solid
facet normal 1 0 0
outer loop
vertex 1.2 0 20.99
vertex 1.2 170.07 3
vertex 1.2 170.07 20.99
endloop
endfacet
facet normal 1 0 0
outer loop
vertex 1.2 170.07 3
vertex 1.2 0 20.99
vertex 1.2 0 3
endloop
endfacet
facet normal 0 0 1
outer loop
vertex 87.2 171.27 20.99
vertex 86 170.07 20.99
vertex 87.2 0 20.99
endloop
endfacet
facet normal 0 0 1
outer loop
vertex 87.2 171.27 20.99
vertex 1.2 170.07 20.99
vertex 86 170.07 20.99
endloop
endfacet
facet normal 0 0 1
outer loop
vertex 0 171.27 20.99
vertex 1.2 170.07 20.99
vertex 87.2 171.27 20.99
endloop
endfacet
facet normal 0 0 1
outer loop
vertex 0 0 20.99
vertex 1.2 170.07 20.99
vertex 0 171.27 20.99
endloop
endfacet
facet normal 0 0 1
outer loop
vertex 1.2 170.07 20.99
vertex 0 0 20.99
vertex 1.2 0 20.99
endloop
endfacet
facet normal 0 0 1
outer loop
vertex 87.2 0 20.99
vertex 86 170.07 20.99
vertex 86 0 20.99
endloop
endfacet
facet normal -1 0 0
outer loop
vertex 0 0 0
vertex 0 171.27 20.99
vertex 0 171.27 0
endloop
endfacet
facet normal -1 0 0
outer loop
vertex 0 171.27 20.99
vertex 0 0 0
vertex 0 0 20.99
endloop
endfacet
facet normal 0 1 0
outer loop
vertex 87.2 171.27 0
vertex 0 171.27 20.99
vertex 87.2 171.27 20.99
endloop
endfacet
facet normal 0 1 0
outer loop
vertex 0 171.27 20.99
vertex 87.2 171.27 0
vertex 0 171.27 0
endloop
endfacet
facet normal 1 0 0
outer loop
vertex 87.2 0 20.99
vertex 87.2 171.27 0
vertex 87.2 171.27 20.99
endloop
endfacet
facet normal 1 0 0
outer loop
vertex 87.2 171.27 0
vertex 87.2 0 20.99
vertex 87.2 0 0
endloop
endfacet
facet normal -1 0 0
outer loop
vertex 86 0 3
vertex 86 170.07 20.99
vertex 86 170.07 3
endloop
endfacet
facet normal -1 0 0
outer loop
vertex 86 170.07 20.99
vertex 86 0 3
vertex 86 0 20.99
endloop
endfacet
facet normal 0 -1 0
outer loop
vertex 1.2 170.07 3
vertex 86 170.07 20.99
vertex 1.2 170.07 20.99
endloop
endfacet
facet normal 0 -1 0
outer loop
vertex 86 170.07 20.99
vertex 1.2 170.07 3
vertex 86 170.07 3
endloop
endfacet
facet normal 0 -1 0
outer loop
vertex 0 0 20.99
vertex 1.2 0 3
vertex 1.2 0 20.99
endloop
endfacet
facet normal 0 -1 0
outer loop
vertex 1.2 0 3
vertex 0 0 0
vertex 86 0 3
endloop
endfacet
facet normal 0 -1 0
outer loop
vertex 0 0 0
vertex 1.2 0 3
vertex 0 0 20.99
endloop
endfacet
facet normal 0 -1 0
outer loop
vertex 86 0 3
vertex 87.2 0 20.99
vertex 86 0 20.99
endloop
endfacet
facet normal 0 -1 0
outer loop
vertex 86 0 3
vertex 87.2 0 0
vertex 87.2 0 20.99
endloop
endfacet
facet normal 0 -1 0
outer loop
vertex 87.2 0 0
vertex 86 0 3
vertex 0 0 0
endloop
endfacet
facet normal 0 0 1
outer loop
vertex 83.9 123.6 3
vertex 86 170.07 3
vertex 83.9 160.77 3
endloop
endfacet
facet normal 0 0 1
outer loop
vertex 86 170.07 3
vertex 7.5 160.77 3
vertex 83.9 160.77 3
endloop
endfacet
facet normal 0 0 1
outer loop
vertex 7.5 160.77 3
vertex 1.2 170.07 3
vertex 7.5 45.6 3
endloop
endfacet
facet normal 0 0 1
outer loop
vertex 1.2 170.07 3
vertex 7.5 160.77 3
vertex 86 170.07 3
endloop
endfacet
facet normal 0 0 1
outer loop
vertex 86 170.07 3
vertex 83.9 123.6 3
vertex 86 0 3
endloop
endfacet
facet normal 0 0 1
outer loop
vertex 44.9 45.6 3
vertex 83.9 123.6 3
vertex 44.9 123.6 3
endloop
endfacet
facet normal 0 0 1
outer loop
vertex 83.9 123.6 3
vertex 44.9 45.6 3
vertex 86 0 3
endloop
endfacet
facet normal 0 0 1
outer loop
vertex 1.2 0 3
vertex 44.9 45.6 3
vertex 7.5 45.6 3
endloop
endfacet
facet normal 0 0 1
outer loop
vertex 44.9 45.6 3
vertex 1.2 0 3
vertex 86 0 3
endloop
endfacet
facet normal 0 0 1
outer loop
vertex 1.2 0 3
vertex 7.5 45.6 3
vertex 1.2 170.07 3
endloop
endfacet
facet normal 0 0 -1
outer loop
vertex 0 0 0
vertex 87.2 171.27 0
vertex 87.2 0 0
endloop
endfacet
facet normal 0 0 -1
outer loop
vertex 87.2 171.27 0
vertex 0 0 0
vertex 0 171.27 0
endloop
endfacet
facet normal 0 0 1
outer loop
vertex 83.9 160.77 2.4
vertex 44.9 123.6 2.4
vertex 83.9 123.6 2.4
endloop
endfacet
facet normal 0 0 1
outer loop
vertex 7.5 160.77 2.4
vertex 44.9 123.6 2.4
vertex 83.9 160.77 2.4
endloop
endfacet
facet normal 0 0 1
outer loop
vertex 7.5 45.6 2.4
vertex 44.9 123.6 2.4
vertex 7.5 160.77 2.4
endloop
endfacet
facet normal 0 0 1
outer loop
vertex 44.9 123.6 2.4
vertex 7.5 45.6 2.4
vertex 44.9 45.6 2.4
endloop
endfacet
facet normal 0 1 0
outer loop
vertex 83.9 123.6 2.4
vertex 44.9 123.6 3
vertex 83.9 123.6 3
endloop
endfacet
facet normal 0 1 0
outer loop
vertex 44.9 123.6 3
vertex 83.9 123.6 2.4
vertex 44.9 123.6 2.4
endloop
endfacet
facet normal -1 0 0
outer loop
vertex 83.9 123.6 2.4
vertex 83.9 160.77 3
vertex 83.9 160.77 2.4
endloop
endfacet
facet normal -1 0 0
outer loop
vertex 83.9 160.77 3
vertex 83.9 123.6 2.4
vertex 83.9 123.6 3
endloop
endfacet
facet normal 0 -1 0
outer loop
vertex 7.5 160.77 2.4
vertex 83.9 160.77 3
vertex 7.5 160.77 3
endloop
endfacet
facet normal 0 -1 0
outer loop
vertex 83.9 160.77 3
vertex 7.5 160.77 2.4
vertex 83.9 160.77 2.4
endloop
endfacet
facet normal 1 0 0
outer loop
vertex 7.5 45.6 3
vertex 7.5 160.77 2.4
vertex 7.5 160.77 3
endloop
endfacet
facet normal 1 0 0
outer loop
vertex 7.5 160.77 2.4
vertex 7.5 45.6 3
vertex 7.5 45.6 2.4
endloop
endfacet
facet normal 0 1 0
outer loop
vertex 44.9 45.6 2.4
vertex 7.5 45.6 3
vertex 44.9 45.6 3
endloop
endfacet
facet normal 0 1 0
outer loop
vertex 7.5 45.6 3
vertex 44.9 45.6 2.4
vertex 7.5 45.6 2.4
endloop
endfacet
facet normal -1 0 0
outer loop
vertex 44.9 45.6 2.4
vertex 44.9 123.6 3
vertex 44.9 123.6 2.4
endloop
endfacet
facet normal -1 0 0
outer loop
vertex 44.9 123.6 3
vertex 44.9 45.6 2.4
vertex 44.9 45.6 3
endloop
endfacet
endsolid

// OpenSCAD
// file: _house_dimensions.scad
// house-model house.yaml sha256:b403971d6ccc486d2b9b900240d76d123e38841db81cfec51cfa9b3c422aa123 body sha256:1576417733979c84b3390dbbce24bebfcbb94d447da4fc7ca72391a9507b883a
// Generated by house-model tools/house_model/export.py from house.yaml.
// Copy this file verbatim into its consumer; never edit it (house-model docs/consuming.md).
// Millimetres in the house-model frame.

// Plot
plot_x0 = -1050;
plot_x1 = 7670;
plot_y0 = -6300;
plot_y1 = 32127;
patio_y0 = 12980;
patio_y1 = 14980;
drive_x0 = 5600;
fence_h = 1800;
fence_y0 = 4400;
east_fence_y0 = 12980;

// Main house
main_x0 = 1970;
main_x1 = 7670;
main_y0 = 0;
main_y1 = 5871;
main_eaves_h = 5300;
main_ridge_h = 6700;
front_overhang = 300;
verge_overhang = 150;
bay_x0 = 2820;
bay_x1 = 5370;
bay_proj = 900;
bay_h = 2700;
canopy_y = -1000;
canopy_z0 = 2350;
canopy_z1 = 2800;
canopy_t = 150;

// Rear extension and first-floor rear block
rear_x0 = 0;
rear_x1 = 7670;
rear_y0 = 5871;
rear_y1 = 12980;
ff_x0 = 2150;
ff_x1 = 7670;
rear_eaves_h = 5100;
rear_ridge_h = 6400;
side_x0 = 0;
side_x1 = 1970;
side_y0 = 4370;
side_y1 = 5871;
flat_h = 3100;
chim_x0 = 1870;
chim_x1 = 2370;
chim_y0 = 3250;
chim_y1 = 3750;
chim_h = 7500;
pot_d = 250;
pot_h = 300;
rooflight_d = 50;

// Garden room
gr_x0 = -280;
gr_x1 = 7320;
gr_y1 = 31057;
gr_north_y0 = 27380;
gr_west_x1 = 3420;
gr_west_y0 = 24580;
gr_wall_h = 2530;
gr_roof_t = 250;
cov_x1 = 3420;
cov_y0 = 19580;
post_w = 150;
low_wall_t = 215;
low_wall_h = 750;

// Openings: [plane, a0, a1, z0, z1]; plane is Y on south/north faces, X on west/east
house_cuts_south = [
    [-900, 3020, 5170, 800, 2280],
    [0, 5960, 7310, 0, 2180],
    [0, 2861, 4570, 3261, 4731],
    [0, 5971, 6560, 3331, 4731],
    [4370, 1000, 1900, 0, 2280]
];
house_cuts_north = [
    [12980, 1200, 6470, 180, 2280],
    [12980, 5151, 6871, 3512, 4862],
    [12980, 3202, 3782, 3512, 4862]
];
house_cuts_west = [
    [0, 5900, 6800, 0, 2080],
    [1970, 4800, 5700, 3150, 4810],
    [2150, 6865, 7764, 3932, 4682],
    [2150, 8456, 9055, 3932, 4682]
];
house_cuts_east = [];
garden_cuts_south = [
    [24580, 1020, 2620, 0, 2100],
    [27380, 4600, 6730, 0, 2100]
];
garden_cuts_north = [];
garden_cuts_west = [
    [-280, 29657, 30257, 1500, 2200]
];
garden_cuts_east = [
    [3420, 25012, 26362, 950, 2200]
];

// Rooflights: [x0, x1, y0, y1]
rooflights = [
    [800, 1550, 7900, 8900],
    [800, 1550, 9700, 10700]
];
// file: _home_model.scad
// =====================================
// Home massing model
// 1:100 printable massing model of a two-storey semi with rear and side
// extensions, its plot and the garden room, from the architect's 1:50
// drawings. All figures below are real millimetres.
// =====================================
// Parts:
//   home_house        -> home_house.stl        house, roofs, bay, canopy, chimney
//   home_garden_room  -> home_garden_room.stl  L-shaped shower/office/workshop
//   home_site_front   -> home_site_front.stl   front plot tile (Y up to 15000)
//   home_site_rear    -> home_site_rear.stl    rear plot tile (Y from 15000)
//   home_assembly     -> home_assembly.stl     viewing aid, not a printable part
//
// Site frame: X east (party wall side), Y towards the rear garden, Z up;
// X = 0 at the west face of the rear extension, Y = 0 at the main house
// front face. scale_denominator divides everything at the end.

$fn = 64;

scale_denominator = 100;
s = 1 / scale_denominator;

// Print-size features (printed mm x scale_denominator)
base_t    = 3   * scale_denominator;
recess_d  = 0.6 * scale_denominator;
relief_h  = 0.5 * scale_denominator;
opening_d = 0.5 * scale_denominator;
fence_t   = 1.2 * scale_denominator;
fit_clear = 0.2 * scale_denominator;
eps = 1;

// Dimensions: plot, main house, rear extension, garden room, opening and
// rooflight lists come from _house_dimensions.scad, a verbatim copy of
// house-model's exports/3d-models/_house_dimensions.scad. Never edit it here.
include <_house_dimensions.scad>

tile_split_y = 15000;
main_ridge_y = (main_y0 + main_y1) / 2;
rear_ridge_x = (ff_x0 + ff_x1) / 2;  hip_len = (ff_x1 - ff_x0) / 2;
gr_h = gr_wall_h + gr_roof_t;

module box(x0, x1, y0, y1, z0, z1) { translate([x0, y0, z0]) cube([x1 - x0, y1 - y0, z1 - z0]); }
module cut_south(y, x0, x1, z0, z1) { box(x0, x1, y - eps, y + opening_d, z0 - eps, z1); }
module cut_north(y, x0, x1, z0, z1) { box(x0, x1, y - opening_d, y + eps, z0 - eps, z1); }
module cut_west(x, y0, y1, z0, z1)  { box(x - eps, x + opening_d, y0, y1, z0 - eps, z1); }
module cut_east(x, y0, y1, z0, z1)  { box(x - opening_d, x + eps, y0, y1, z0 - eps, z1); }
module yz_prism(x0, x1, pts) { translate([x0, 0, 0]) rotate([90, 0, 90]) linear_extrude(x1 - x0) polygon(pts); }

module main_roof() {
    k = (main_ridge_h - main_eaves_h) / (main_ridge_y - main_y0);
    yz_prism(main_x0 - verge_overhang, main_x1, [
        [main_y0 - front_overhang, main_eaves_h - front_overhang * k],
        [main_ridge_y, main_ridge_h], [main_y1, main_eaves_h]]);
}
// Hip prism starts under the main ridge so the union forms the valleys.
module rear_roof() {
    hull() {
        box(ff_x0, ff_x1, main_ridge_y, rear_y1, rear_eaves_h - eps, rear_eaves_h);
        box(rear_ridge_x - 1, rear_ridge_x + 1, main_ridge_y, rear_y1 - hip_len, rear_ridge_h - 1, rear_ridge_h);
    }
}
module canopy() {
    yz_prism(bay_x0, main_x1, [[canopy_y, canopy_z0], [eps, canopy_z1],
        [eps, canopy_z1 - canopy_t], [canopy_y, canopy_z0 - canopy_t]]);
}
module chimney() {
    box(chim_x0, chim_x1, chim_y0, chim_y1, 0, chim_h);
    for (x = [chim_x0 + 125, chim_x1 - 125])
        translate([x, (chim_y0 + chim_y1) / 2, chim_h - eps]) cylinder(d = pot_d, h = pot_h + eps);
}
module house_real() {
    difference() {
        union() {
            box(main_x0, main_x1, main_y0, main_y1, 0, main_eaves_h);
            box(rear_x0, rear_x1, rear_y0 - eps, rear_y1, 0, flat_h);
            box(ff_x0, ff_x1, rear_y0 - eps, rear_y1, 0, rear_eaves_h);
            box(side_x0, side_x1 + eps, side_y0, side_y1 + eps, 0, flat_h);
            box(bay_x0, bay_x1, -bay_proj, eps, 0, bay_h);
            main_roof(); rear_roof(); canopy(); chimney();
        }
        for (c = house_cuts_south) cut_south(c[0], c[1], c[2], c[3], c[4]);
        for (c = house_cuts_north) cut_north(c[0], c[1], c[2], c[3], c[4]);
        for (c = house_cuts_west)  cut_west(c[0], c[1], c[2], c[3], c[4]);
        for (c = house_cuts_east)  cut_east(c[0], c[1], c[2], c[3], c[4]);
        for (r = rooflights) box(r[0], r[1], r[2], r[3], flat_h - rooflight_d, flat_h + eps);
    }
}
module garden_room_real() {
    difference() {
        union() {
            box(gr_x0, gr_x1, gr_north_y0, gr_y1, 0, gr_h);
            box(gr_x0, gr_west_x1, gr_west_y0, gr_north_y0 + eps, 0, gr_h);
            box(gr_x0, cov_x1, cov_y0, gr_west_y0 + eps, gr_wall_h, gr_h);
            for (x = [gr_x0, cov_x1 - post_w], y = [cov_y0, (cov_y0 + gr_west_y0) / 2])
                box(x, x + post_w, y, y + post_w, 0, gr_wall_h + eps);
            box(gr_x0, gr_x0 + low_wall_t, cov_y0, gr_west_y0 + eps, 0, low_wall_h);
        }
        for (c = garden_cuts_south) cut_south(c[0], c[1], c[2], c[3], c[4]);
        for (c = garden_cuts_north) cut_north(c[0], c[1], c[2], c[3], c[4]);
        for (c = garden_cuts_west)  cut_west(c[0], c[1], c[2], c[3], c[4]);
        for (c = garden_cuts_east)  cut_east(c[0], c[1], c[2], c[3], c[4]);
    }
}
module house_footprint_2d() {
    translate([main_x0, main_y0]) square([main_x1 - main_x0, main_y1 - main_y0]);
    translate([bay_x0, -bay_proj]) square([bay_x1 - bay_x0, bay_proj + eps]);
    translate([rear_x0, rear_y0 - eps]) square([rear_x1 - rear_x0, rear_y1 - rear_y0 + eps]);
    translate([side_x0, side_y0]) square([side_x1 - side_x0 + eps, side_y1 - side_y0 + eps]);
}
module garden_room_footprint_2d() {
    translate([gr_x0, gr_north_y0]) square([gr_x1 - gr_x0, gr_y1 - gr_north_y0]);
    translate([gr_x0, gr_west_y0]) square([gr_west_x1 - gr_x0, gr_north_y0 - gr_west_y0 + eps]);
    translate([gr_x0, cov_y0]) square([cov_x1 - gr_x0, gr_west_y0 - cov_y0 + eps]);
}
module fences() {
    box(plot_x0, plot_x0 + fence_t, fence_y0, plot_y1, 0, fence_h);
    box(plot_x1 - fence_t, plot_x1, east_fence_y0, plot_y1, 0, fence_h);
    box(plot_x0, plot_x1, plot_y1 - fence_t, plot_y1, 0, fence_h);
    box(plot_x0, 0, fence_y0, fence_y0 + fence_t, 0, fence_h);
}
module relief() {
    box(plot_x0, plot_x1, patio_y0, patio_y1, 0, base_t + relief_h);
    box(plot_x0, 0, plot_y0, rear_y1, 0, base_t + relief_h);
    box(drive_x0, plot_x1, plot_y0, -bay_proj, 0, base_t + relief_h);
}
module tile_real(y0, y1) {
    difference() {
        union() {
            box(plot_x0, plot_x1, y0, y1, 0, base_t);
            intersection() { box(plot_x0, plot_x1, y0, y1, 0, base_t + relief_h + eps); relief(); }
            intersection() { box(plot_x0, plot_x1, y0, y1, 0, base_t + fence_h + eps); translate([0, 0, base_t - eps]) fences(); }
        }
        translate([0, 0, base_t - recess_d]) linear_extrude(recess_d + relief_h + 2 * eps)
            offset(delta = fit_clear) { house_footprint_2d(); garden_room_footprint_2d(); }
    }
}
module site_front_real() { tile_real(plot_y0, tile_split_y); }
module site_rear_real()  { tile_real(tile_split_y, plot_y1); }
module home_assembly_real() {
    site_front_real(); site_rear_real();
    translate([0, 0, base_t - recess_d]) { house_real(); garden_room_real(); }
}
// main file
include <_home_model.scad>

scale(s) translate([-plot_x0, -tile_split_y, 0]) site_rear_real();
